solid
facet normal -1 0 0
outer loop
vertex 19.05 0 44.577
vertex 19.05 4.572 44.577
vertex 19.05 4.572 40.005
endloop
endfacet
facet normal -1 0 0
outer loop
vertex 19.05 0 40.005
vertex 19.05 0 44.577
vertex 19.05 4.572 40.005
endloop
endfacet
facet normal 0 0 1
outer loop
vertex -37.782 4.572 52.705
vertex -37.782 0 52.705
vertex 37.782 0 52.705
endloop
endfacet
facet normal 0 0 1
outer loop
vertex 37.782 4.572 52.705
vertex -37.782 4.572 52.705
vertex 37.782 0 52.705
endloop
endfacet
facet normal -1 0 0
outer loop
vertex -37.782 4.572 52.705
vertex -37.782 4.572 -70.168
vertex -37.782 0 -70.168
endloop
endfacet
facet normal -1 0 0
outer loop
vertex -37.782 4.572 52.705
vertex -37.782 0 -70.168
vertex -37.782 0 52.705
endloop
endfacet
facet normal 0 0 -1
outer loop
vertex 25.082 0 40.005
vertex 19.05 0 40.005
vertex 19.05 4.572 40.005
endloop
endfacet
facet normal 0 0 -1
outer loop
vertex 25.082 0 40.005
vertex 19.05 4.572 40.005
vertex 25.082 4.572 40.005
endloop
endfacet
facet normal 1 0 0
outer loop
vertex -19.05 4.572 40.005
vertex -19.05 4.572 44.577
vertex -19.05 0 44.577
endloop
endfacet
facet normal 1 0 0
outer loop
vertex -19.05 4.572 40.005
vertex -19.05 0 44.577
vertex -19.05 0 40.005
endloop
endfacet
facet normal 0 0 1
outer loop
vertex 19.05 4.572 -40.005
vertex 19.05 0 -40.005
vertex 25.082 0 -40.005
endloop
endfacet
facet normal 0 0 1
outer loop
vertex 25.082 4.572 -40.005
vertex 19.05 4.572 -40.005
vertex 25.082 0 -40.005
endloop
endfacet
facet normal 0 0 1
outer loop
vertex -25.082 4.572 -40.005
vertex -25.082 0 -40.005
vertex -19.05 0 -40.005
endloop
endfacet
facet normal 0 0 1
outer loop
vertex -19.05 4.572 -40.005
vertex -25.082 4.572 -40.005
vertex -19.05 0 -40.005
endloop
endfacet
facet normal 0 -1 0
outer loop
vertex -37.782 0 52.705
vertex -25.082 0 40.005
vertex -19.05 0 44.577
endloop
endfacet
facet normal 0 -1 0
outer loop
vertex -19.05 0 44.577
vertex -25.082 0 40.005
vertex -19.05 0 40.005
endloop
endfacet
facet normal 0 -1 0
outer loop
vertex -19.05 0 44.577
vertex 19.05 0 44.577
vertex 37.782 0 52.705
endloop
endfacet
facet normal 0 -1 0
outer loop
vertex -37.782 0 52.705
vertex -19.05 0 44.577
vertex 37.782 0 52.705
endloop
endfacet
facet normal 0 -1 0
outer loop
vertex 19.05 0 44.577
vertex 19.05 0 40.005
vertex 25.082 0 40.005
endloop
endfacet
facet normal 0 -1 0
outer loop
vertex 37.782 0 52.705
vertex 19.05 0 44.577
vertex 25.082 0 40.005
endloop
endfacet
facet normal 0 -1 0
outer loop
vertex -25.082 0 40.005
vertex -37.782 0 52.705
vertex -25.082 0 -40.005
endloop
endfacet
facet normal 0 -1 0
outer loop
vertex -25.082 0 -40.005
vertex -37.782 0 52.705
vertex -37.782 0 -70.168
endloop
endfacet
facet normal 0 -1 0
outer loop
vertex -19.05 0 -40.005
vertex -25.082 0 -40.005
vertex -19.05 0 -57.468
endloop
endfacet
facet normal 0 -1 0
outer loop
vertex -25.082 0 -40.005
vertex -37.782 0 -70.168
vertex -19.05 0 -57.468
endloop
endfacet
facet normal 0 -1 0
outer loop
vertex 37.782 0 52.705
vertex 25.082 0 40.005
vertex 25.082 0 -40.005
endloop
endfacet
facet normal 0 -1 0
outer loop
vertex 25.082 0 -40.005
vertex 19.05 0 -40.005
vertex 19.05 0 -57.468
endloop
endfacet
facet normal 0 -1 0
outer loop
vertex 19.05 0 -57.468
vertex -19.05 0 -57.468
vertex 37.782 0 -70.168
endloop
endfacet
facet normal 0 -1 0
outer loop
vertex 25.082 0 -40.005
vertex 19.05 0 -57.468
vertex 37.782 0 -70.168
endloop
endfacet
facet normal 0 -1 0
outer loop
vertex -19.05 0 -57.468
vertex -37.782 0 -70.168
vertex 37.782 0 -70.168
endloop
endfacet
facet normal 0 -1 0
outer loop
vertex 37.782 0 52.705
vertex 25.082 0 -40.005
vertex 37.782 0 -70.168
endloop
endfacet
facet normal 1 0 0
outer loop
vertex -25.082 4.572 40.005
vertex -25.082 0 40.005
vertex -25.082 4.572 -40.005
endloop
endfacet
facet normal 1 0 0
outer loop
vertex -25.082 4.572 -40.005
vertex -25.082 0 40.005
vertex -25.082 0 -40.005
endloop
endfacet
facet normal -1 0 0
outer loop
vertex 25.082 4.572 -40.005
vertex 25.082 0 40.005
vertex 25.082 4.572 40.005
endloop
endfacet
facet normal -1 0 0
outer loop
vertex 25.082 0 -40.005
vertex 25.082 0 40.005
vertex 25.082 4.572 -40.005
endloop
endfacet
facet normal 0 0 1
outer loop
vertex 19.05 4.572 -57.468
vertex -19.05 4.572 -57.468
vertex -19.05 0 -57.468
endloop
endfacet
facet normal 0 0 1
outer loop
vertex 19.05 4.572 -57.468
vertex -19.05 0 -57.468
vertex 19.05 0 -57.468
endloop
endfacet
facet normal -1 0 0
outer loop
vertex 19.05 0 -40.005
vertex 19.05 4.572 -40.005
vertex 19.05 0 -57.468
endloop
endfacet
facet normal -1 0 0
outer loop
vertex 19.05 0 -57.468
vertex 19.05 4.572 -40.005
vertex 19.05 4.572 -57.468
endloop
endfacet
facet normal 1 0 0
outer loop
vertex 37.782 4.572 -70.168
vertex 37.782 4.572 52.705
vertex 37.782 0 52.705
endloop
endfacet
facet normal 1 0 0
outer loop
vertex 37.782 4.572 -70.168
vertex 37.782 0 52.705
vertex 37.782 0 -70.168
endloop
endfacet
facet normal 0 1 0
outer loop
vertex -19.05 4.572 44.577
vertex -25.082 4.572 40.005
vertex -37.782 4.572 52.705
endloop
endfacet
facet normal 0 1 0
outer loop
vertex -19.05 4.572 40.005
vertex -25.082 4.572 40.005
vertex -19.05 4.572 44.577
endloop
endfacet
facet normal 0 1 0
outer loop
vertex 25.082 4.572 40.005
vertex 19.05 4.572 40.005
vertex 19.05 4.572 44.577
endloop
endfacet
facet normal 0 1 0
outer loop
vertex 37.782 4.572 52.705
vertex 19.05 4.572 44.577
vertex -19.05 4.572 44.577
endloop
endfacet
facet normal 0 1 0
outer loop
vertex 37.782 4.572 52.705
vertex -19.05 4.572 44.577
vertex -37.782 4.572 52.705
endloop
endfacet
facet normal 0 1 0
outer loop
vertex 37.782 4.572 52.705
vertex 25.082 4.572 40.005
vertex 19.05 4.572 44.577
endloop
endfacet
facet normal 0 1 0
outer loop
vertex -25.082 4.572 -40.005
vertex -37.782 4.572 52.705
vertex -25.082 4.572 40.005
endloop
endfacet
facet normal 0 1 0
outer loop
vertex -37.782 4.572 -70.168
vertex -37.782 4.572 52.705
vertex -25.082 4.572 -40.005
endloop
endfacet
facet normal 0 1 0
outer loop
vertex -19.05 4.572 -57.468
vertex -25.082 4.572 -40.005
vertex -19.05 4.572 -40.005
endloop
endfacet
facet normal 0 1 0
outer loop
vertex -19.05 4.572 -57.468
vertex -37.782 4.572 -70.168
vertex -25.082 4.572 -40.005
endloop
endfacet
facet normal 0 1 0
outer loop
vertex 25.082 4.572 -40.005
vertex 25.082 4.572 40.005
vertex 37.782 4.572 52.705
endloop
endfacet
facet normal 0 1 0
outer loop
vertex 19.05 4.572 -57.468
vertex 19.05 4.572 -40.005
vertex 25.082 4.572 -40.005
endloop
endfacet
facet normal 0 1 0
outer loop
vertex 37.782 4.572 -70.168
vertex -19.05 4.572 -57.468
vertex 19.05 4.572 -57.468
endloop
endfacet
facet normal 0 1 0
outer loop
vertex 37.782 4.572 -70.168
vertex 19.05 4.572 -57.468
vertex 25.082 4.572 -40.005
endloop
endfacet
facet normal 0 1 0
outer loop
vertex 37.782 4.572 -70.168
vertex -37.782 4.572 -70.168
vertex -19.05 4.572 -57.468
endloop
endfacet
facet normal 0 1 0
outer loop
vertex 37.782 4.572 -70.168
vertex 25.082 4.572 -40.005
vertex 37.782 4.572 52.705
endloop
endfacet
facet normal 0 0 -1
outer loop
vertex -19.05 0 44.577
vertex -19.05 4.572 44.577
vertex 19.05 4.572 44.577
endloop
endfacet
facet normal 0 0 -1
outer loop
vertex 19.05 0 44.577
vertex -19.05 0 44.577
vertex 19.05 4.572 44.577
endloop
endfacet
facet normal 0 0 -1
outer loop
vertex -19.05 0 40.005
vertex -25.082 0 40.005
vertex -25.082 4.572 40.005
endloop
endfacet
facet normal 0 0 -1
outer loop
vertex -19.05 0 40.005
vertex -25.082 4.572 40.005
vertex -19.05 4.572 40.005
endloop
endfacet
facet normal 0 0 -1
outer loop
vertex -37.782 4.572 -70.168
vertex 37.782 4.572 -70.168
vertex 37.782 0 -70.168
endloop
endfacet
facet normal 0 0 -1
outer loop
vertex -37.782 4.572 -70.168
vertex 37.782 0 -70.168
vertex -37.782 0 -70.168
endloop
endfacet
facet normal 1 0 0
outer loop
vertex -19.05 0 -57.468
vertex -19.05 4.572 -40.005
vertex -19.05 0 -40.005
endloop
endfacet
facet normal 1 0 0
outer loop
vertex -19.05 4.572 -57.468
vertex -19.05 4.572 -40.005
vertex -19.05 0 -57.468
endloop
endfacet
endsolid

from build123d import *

# Parameters (mm, degrees)
SKETCH1_W           = 75.565
SKETCH1_H           = 105.41
SKETCH1_W_2         = 50.165
SKETCH1_H_2         = 80.01
BOSS_EXTRUDE1_DEPTH = 4.572
SKETCH2_W           = 38.1
SKETCH2_H           = 4.572
SKETCH2_H_2         = 8.128
CUT_EXTRUDE1_DEPTH  = 5.572
SKETCH3_W           = 38.1
SKETCH3_H           = 4.572
CUT_EXTRUDE2_DEPTH  = 5.572
SKETCH4_W           = 18.7325
SKETCH4_H           = 4.7625
BOSS_EXTRUDE2_DEPTH = 4.572


with BuildPart() as part:
    # Sketch1 → Boss-Extrude1 (new body)
    with BuildSketch(Plane(origin=(0, 0, 0), x_dir=(1, 0, 0), z_dir=(0, 1, 0))):
        Rectangle(SKETCH1_W, SKETCH1_H)
        Rectangle(SKETCH1_W_2, SKETCH1_H_2, mode=Mode.SUBTRACT)
    extrude(amount=BOSS_EXTRUDE1_DEPTH)

    # Sketch2 → Cut-Extrude1 (cut, through all)
    with BuildSketch(Plane(origin=(0, 4.572, 0), x_dir=(1, 0, 0), z_dir=(0, 1, 0))):
        with Locations((0, -42.291)):
            Rectangle(SKETCH2_W, SKETCH2_H)
        with Locations((0, 44.069)):
            Rectangle(SKETCH2_W, SKETCH2_H_2)
    extrude(amount=-CUT_EXTRUDE1_DEPTH, mode=Mode.SUBTRACT)

    # Sketch3 → Cut-Extrude2 (cut, through all)
    with BuildSketch(Plane(origin=(0, 4.572, 0), x_dir=(1, 0, 0), z_dir=(0, 1, 0))):
        with Locations((0, 50.419)):
            Rectangle(SKETCH3_W, SKETCH3_H)
    extrude(amount=-CUT_EXTRUDE2_DEPTH, mode=Mode.SUBTRACT)

    # Sketch4 → Boss-Extrude2 (add)
    with BuildSketch(Plane(origin=(0, 4.572, 0), x_dir=(1, 0, 0), z_dir=(0, 1, 0))):
        Polygon((-37.7825, 57.4675), (-19.05, 57.4675), (19.05, 57.4675), (37.7825, 57.4675), (37.7825, 70.1675), (-37.7825, 70.1675), align=None)
        with Locations((-28.41625, 55.08625)):
            Rectangle(SKETCH4_W, SKETCH4_H)
        with Locations((28.41625, 55.08625)):
            Rectangle(SKETCH4_W, SKETCH4_H)
    extrude(amount=-BOSS_EXTRUDE2_DEPTH)


solid = part.part
